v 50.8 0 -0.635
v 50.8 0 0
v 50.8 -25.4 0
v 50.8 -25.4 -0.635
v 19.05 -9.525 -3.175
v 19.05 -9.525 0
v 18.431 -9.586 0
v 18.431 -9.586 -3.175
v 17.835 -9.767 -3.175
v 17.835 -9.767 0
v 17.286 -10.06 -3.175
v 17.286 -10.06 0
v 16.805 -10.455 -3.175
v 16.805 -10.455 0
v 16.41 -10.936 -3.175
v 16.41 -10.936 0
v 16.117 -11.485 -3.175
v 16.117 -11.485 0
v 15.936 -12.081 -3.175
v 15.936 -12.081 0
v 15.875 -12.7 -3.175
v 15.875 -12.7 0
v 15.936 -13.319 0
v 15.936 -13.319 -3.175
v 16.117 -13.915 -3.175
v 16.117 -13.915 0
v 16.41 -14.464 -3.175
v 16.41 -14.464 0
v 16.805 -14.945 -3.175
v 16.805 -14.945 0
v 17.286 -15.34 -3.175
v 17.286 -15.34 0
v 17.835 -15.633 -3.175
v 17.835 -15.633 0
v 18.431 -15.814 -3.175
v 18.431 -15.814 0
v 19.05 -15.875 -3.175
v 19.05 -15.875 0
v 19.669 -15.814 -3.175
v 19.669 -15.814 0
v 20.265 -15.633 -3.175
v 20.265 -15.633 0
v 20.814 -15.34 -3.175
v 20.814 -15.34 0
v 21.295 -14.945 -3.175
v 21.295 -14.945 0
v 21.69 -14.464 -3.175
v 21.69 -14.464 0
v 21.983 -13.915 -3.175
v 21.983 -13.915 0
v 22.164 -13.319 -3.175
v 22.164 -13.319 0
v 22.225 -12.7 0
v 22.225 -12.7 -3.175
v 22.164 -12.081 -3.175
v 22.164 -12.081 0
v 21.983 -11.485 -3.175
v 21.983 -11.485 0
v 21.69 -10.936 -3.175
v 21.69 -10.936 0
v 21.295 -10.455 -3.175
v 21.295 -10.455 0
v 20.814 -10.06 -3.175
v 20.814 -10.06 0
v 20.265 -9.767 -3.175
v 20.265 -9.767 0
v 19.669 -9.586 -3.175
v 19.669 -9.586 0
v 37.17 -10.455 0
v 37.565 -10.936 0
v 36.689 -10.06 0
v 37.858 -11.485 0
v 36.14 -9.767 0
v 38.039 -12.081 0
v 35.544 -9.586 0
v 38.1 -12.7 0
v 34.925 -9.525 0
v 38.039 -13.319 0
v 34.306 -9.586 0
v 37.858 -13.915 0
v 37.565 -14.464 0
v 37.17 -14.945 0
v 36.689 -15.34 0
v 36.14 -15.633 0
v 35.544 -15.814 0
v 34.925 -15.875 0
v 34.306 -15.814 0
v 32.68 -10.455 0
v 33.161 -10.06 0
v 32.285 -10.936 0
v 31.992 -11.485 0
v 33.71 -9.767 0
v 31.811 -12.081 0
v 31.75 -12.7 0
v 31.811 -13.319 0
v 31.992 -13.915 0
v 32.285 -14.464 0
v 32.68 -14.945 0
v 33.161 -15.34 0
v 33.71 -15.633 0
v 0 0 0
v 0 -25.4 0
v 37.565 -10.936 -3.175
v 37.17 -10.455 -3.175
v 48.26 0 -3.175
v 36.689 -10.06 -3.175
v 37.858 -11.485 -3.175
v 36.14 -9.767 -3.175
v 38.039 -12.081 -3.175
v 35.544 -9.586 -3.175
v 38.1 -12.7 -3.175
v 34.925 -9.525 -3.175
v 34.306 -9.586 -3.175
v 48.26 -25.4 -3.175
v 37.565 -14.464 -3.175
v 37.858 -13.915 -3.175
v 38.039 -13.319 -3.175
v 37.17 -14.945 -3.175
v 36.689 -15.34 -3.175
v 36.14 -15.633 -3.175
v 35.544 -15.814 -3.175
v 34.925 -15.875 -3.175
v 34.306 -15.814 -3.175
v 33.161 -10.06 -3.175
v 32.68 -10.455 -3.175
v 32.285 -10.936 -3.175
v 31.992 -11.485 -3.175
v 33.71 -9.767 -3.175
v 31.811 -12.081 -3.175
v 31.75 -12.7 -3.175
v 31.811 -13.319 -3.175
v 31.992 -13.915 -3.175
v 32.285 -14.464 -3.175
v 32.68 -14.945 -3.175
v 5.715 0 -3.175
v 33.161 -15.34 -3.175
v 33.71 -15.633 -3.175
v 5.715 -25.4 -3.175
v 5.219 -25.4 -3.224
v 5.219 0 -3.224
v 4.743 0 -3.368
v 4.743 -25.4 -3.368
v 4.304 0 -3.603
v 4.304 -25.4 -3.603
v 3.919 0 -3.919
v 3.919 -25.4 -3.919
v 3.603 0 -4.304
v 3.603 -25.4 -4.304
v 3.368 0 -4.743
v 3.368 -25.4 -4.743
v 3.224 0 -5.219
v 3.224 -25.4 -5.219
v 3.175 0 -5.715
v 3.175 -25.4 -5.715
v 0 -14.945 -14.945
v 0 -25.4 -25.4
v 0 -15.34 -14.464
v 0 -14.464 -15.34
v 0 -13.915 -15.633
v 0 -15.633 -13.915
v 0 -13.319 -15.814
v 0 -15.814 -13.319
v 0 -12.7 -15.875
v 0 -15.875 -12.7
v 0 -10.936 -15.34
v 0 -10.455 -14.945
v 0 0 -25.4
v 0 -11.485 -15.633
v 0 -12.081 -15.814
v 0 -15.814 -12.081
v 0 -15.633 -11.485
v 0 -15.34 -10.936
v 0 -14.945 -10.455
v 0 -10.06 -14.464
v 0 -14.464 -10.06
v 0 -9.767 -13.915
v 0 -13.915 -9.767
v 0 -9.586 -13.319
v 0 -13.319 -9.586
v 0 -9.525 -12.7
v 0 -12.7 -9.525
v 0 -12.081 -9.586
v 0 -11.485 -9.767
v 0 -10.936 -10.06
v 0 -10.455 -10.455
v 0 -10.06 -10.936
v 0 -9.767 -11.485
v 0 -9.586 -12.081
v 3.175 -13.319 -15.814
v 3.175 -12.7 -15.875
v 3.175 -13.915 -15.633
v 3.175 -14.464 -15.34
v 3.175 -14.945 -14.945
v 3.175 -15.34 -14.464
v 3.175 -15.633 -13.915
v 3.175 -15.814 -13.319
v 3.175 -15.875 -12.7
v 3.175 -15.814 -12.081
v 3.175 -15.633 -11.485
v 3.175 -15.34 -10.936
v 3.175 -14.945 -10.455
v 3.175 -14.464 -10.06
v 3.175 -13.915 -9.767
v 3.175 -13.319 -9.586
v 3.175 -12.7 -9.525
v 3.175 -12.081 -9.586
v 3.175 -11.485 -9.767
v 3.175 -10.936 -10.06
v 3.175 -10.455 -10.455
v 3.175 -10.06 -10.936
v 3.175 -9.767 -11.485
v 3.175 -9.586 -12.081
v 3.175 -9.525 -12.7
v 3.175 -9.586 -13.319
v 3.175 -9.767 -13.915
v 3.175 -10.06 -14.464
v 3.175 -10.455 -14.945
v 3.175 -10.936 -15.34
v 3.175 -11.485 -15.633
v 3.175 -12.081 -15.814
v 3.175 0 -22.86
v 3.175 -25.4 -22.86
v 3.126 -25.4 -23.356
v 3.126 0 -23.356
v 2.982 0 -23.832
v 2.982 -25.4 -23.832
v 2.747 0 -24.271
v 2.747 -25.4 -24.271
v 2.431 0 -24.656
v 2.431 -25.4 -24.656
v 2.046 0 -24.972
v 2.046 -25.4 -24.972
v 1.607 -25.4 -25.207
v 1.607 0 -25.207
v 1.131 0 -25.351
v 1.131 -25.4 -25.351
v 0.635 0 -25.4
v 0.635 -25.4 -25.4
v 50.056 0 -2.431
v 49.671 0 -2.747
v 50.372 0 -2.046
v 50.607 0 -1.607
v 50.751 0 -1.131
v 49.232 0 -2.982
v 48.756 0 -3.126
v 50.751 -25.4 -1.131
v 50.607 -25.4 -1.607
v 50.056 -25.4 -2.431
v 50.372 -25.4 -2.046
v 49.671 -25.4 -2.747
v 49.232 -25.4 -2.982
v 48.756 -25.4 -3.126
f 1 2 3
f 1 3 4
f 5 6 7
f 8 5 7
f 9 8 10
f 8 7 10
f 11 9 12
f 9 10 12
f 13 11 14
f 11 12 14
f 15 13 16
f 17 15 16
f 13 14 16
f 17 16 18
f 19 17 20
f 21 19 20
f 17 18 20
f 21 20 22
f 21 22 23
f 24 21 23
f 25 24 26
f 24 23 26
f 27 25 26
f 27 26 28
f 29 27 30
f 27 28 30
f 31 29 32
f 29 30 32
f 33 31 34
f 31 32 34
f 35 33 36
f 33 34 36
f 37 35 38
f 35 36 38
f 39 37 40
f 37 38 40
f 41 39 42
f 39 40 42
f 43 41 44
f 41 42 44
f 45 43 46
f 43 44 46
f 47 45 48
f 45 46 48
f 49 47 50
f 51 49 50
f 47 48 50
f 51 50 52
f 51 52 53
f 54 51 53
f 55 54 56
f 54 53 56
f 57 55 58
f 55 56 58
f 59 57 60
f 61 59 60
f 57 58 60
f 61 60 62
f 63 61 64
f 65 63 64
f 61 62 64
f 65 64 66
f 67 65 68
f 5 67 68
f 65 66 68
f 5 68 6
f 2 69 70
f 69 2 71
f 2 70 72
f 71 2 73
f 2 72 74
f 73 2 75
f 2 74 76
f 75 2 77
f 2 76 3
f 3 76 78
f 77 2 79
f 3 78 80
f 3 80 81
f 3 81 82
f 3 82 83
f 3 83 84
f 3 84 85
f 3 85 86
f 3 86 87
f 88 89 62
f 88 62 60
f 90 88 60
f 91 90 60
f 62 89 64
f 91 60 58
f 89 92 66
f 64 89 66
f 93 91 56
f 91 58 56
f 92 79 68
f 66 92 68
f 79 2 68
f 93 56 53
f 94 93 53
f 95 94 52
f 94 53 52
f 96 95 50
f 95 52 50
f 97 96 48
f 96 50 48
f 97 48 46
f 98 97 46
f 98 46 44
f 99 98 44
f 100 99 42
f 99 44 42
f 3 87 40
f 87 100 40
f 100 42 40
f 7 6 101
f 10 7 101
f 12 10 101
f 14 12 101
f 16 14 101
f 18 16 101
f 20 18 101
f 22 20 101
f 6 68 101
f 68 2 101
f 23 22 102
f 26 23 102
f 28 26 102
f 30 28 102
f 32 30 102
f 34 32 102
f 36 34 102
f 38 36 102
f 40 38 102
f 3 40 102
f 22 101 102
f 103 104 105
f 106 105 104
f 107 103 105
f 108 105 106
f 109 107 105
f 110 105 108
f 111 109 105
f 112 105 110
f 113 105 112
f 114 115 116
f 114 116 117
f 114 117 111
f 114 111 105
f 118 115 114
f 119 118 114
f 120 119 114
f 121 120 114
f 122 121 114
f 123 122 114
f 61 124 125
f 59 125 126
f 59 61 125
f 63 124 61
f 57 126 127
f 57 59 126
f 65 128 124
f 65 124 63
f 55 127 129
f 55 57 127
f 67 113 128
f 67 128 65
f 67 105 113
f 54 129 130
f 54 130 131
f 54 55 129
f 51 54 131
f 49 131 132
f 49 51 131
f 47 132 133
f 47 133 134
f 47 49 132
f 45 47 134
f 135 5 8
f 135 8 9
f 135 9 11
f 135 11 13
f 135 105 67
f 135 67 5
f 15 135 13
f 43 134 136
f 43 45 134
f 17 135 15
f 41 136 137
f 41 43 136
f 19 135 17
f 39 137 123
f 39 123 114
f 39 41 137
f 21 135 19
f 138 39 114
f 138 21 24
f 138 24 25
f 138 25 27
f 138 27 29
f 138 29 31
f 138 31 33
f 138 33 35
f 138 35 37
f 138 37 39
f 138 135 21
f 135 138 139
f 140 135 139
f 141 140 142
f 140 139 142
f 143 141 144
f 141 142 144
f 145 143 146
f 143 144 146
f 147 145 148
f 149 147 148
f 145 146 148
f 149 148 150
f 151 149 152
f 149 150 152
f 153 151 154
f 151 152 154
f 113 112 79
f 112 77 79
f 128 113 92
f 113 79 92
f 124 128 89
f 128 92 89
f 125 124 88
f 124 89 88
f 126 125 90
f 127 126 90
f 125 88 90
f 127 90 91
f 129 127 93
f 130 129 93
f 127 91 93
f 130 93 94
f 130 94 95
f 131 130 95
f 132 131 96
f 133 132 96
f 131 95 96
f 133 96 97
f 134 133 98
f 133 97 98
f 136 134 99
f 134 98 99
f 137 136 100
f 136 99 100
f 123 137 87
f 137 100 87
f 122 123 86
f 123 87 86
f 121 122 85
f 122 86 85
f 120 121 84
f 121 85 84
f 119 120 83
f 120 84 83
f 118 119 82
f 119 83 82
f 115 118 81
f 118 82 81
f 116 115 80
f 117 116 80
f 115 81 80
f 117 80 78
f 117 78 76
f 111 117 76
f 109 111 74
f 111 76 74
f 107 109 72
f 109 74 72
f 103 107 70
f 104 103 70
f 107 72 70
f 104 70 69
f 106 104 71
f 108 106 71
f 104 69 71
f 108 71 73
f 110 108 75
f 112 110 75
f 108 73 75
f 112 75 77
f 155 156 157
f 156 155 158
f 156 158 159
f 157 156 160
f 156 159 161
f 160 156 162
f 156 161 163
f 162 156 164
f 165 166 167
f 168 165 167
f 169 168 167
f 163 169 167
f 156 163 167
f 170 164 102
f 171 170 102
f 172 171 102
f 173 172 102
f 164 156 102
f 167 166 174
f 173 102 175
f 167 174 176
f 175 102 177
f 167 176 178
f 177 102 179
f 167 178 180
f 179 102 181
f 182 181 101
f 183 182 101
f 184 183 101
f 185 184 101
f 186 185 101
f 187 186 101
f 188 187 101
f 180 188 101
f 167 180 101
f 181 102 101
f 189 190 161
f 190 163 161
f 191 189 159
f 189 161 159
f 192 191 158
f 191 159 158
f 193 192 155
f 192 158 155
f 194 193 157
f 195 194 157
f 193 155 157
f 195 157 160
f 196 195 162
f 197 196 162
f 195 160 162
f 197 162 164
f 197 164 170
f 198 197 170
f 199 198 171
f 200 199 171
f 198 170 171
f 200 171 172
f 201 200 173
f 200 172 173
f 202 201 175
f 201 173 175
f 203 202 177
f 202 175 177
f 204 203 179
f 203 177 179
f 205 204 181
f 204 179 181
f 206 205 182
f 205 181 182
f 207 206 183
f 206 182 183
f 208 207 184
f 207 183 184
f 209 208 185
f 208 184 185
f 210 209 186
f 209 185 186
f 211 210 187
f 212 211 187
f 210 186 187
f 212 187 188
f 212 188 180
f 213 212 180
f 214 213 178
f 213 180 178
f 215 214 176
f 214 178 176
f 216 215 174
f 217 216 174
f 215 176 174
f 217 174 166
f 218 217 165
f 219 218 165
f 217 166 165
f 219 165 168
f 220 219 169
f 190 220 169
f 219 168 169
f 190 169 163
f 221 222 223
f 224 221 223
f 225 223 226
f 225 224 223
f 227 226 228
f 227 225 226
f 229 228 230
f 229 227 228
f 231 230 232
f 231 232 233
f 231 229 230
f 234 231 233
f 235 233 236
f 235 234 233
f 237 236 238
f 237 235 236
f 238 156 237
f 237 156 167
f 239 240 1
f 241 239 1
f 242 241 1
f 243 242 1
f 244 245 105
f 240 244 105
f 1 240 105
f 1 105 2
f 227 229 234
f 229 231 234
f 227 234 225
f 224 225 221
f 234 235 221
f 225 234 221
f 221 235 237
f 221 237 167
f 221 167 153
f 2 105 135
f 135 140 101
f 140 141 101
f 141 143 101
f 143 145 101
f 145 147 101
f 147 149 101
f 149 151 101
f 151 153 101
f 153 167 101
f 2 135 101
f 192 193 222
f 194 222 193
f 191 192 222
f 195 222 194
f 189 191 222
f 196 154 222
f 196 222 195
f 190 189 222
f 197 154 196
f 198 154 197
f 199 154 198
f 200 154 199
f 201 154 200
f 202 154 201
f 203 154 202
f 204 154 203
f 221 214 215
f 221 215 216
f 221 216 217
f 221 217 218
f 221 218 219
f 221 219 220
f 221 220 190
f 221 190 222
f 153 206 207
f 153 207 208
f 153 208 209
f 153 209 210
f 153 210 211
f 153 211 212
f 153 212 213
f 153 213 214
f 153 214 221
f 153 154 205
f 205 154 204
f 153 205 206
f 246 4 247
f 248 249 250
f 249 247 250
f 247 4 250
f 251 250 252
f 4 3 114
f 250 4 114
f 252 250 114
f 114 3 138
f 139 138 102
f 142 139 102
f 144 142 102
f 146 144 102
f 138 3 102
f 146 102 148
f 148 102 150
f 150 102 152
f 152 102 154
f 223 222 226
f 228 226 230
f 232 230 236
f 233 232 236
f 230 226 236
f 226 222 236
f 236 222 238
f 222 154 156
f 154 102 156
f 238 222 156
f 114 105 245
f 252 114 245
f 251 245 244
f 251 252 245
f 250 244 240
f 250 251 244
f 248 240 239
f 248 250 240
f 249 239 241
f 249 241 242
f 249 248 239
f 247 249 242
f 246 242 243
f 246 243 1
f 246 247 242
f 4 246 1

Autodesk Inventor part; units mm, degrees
ref_plane "YZ Plane" through (0, 0, 0) normal (1, 0, 0) x (0, 1, 0)
ref_plane "XZ Plane" through (0, 0, 0) normal (0, 1, 0) x (-1, 0, 0)
ref_plane "XY Plane" through (0, 0, 0) normal (0, 0, 1) x (1, 0, 0)
sketch "Sketch1" plane through (0, 0, 0) normal (1, 0, 0) x (0, 1, 0)
  line L0 (0, 0) -> (-25.4, 0)
  line L1 (-25.4, 0) -> (-25.4, -25.4)
  line L2 (-25.4, -25.4) -> (0, -25.4)
  line L3 (0, -25.4) -> (0, 0)
  dimension "d0" = 25.4
  dimension "d1" = 25.4
extrude "Extrusion1" add sketch "Sketch1" along normal blind 3.175
sketch "Sketch2" plane through (3.175, 0, 0) normal (1, 0, 0) x (0, 0, -1)
  line L0 (0, 0) -> (3.175, 0)
  line L1 (3.175, 0) -> (3.175, -25.4)
  line L2 (3.175, -25.4) -> (0, -25.4)
  line L3 (0, -25.4) -> (0, 0)
  dimension "d4" = 3.175
  dimension "d5" = 25.4
extrude "Extrusion2" add sketch "Sketch2" along normal blind 47.625
sketch "Sketch3" plane through (3.175, -25.4, -3.175) normal (0, 0, -1) x (-1, 0, 0)
  line L0 (-47.625, 0) -> (-47.625, 25.4) projected
  line L1 (0, 0) -> (0, 25.4) projected
  line L2 (0, 0) -> (-47.625, 0) projected
  point P0 (3.175, 25.4)
  point P1 (-31.75, 12.7)
  point P2 (-15.875, 12.7)
  dimension "d8" = 15.875
  dimension "d9" = 15.875
  dimension "d10" = 15.875
  dimension "d11" = 12.7
hole "Hole1" at (34.925, -12.7, -3.175) at (19.05, -12.7, -3.175) direction (0, 0, 1) diameter 6.35 end through all
sketch "Sketch4" plane through (3.175, 0, 0) normal (1, 0, 0) x (0, 0, -1)
  line L0 (25.4, 0) -> (3.175, 0) projected
  line L1 (25.4, -25.4) -> (25.4, 0) projected
  point P0 (0, 0)
  point P1 (12.7, -12.7)
  dimension "d19" = 12.7
  dimension "d20" = 12.7
hole "Hole2" at (3.175, -12.7, -12.7) direction (-1, 0, 0) diameter 6.35 end through all
fillet "Fillet1" radius 2.54 1 edges at (50.8, -12.7, -3.175)
fillet "Fillet2" radius 2.54 1 edges at (3.175, -12.7, -3.175)
fillet "Fillet3" radius 2.54 1 edges at (3.175, -12.7, -25.4)
properties part number "L bracket"
